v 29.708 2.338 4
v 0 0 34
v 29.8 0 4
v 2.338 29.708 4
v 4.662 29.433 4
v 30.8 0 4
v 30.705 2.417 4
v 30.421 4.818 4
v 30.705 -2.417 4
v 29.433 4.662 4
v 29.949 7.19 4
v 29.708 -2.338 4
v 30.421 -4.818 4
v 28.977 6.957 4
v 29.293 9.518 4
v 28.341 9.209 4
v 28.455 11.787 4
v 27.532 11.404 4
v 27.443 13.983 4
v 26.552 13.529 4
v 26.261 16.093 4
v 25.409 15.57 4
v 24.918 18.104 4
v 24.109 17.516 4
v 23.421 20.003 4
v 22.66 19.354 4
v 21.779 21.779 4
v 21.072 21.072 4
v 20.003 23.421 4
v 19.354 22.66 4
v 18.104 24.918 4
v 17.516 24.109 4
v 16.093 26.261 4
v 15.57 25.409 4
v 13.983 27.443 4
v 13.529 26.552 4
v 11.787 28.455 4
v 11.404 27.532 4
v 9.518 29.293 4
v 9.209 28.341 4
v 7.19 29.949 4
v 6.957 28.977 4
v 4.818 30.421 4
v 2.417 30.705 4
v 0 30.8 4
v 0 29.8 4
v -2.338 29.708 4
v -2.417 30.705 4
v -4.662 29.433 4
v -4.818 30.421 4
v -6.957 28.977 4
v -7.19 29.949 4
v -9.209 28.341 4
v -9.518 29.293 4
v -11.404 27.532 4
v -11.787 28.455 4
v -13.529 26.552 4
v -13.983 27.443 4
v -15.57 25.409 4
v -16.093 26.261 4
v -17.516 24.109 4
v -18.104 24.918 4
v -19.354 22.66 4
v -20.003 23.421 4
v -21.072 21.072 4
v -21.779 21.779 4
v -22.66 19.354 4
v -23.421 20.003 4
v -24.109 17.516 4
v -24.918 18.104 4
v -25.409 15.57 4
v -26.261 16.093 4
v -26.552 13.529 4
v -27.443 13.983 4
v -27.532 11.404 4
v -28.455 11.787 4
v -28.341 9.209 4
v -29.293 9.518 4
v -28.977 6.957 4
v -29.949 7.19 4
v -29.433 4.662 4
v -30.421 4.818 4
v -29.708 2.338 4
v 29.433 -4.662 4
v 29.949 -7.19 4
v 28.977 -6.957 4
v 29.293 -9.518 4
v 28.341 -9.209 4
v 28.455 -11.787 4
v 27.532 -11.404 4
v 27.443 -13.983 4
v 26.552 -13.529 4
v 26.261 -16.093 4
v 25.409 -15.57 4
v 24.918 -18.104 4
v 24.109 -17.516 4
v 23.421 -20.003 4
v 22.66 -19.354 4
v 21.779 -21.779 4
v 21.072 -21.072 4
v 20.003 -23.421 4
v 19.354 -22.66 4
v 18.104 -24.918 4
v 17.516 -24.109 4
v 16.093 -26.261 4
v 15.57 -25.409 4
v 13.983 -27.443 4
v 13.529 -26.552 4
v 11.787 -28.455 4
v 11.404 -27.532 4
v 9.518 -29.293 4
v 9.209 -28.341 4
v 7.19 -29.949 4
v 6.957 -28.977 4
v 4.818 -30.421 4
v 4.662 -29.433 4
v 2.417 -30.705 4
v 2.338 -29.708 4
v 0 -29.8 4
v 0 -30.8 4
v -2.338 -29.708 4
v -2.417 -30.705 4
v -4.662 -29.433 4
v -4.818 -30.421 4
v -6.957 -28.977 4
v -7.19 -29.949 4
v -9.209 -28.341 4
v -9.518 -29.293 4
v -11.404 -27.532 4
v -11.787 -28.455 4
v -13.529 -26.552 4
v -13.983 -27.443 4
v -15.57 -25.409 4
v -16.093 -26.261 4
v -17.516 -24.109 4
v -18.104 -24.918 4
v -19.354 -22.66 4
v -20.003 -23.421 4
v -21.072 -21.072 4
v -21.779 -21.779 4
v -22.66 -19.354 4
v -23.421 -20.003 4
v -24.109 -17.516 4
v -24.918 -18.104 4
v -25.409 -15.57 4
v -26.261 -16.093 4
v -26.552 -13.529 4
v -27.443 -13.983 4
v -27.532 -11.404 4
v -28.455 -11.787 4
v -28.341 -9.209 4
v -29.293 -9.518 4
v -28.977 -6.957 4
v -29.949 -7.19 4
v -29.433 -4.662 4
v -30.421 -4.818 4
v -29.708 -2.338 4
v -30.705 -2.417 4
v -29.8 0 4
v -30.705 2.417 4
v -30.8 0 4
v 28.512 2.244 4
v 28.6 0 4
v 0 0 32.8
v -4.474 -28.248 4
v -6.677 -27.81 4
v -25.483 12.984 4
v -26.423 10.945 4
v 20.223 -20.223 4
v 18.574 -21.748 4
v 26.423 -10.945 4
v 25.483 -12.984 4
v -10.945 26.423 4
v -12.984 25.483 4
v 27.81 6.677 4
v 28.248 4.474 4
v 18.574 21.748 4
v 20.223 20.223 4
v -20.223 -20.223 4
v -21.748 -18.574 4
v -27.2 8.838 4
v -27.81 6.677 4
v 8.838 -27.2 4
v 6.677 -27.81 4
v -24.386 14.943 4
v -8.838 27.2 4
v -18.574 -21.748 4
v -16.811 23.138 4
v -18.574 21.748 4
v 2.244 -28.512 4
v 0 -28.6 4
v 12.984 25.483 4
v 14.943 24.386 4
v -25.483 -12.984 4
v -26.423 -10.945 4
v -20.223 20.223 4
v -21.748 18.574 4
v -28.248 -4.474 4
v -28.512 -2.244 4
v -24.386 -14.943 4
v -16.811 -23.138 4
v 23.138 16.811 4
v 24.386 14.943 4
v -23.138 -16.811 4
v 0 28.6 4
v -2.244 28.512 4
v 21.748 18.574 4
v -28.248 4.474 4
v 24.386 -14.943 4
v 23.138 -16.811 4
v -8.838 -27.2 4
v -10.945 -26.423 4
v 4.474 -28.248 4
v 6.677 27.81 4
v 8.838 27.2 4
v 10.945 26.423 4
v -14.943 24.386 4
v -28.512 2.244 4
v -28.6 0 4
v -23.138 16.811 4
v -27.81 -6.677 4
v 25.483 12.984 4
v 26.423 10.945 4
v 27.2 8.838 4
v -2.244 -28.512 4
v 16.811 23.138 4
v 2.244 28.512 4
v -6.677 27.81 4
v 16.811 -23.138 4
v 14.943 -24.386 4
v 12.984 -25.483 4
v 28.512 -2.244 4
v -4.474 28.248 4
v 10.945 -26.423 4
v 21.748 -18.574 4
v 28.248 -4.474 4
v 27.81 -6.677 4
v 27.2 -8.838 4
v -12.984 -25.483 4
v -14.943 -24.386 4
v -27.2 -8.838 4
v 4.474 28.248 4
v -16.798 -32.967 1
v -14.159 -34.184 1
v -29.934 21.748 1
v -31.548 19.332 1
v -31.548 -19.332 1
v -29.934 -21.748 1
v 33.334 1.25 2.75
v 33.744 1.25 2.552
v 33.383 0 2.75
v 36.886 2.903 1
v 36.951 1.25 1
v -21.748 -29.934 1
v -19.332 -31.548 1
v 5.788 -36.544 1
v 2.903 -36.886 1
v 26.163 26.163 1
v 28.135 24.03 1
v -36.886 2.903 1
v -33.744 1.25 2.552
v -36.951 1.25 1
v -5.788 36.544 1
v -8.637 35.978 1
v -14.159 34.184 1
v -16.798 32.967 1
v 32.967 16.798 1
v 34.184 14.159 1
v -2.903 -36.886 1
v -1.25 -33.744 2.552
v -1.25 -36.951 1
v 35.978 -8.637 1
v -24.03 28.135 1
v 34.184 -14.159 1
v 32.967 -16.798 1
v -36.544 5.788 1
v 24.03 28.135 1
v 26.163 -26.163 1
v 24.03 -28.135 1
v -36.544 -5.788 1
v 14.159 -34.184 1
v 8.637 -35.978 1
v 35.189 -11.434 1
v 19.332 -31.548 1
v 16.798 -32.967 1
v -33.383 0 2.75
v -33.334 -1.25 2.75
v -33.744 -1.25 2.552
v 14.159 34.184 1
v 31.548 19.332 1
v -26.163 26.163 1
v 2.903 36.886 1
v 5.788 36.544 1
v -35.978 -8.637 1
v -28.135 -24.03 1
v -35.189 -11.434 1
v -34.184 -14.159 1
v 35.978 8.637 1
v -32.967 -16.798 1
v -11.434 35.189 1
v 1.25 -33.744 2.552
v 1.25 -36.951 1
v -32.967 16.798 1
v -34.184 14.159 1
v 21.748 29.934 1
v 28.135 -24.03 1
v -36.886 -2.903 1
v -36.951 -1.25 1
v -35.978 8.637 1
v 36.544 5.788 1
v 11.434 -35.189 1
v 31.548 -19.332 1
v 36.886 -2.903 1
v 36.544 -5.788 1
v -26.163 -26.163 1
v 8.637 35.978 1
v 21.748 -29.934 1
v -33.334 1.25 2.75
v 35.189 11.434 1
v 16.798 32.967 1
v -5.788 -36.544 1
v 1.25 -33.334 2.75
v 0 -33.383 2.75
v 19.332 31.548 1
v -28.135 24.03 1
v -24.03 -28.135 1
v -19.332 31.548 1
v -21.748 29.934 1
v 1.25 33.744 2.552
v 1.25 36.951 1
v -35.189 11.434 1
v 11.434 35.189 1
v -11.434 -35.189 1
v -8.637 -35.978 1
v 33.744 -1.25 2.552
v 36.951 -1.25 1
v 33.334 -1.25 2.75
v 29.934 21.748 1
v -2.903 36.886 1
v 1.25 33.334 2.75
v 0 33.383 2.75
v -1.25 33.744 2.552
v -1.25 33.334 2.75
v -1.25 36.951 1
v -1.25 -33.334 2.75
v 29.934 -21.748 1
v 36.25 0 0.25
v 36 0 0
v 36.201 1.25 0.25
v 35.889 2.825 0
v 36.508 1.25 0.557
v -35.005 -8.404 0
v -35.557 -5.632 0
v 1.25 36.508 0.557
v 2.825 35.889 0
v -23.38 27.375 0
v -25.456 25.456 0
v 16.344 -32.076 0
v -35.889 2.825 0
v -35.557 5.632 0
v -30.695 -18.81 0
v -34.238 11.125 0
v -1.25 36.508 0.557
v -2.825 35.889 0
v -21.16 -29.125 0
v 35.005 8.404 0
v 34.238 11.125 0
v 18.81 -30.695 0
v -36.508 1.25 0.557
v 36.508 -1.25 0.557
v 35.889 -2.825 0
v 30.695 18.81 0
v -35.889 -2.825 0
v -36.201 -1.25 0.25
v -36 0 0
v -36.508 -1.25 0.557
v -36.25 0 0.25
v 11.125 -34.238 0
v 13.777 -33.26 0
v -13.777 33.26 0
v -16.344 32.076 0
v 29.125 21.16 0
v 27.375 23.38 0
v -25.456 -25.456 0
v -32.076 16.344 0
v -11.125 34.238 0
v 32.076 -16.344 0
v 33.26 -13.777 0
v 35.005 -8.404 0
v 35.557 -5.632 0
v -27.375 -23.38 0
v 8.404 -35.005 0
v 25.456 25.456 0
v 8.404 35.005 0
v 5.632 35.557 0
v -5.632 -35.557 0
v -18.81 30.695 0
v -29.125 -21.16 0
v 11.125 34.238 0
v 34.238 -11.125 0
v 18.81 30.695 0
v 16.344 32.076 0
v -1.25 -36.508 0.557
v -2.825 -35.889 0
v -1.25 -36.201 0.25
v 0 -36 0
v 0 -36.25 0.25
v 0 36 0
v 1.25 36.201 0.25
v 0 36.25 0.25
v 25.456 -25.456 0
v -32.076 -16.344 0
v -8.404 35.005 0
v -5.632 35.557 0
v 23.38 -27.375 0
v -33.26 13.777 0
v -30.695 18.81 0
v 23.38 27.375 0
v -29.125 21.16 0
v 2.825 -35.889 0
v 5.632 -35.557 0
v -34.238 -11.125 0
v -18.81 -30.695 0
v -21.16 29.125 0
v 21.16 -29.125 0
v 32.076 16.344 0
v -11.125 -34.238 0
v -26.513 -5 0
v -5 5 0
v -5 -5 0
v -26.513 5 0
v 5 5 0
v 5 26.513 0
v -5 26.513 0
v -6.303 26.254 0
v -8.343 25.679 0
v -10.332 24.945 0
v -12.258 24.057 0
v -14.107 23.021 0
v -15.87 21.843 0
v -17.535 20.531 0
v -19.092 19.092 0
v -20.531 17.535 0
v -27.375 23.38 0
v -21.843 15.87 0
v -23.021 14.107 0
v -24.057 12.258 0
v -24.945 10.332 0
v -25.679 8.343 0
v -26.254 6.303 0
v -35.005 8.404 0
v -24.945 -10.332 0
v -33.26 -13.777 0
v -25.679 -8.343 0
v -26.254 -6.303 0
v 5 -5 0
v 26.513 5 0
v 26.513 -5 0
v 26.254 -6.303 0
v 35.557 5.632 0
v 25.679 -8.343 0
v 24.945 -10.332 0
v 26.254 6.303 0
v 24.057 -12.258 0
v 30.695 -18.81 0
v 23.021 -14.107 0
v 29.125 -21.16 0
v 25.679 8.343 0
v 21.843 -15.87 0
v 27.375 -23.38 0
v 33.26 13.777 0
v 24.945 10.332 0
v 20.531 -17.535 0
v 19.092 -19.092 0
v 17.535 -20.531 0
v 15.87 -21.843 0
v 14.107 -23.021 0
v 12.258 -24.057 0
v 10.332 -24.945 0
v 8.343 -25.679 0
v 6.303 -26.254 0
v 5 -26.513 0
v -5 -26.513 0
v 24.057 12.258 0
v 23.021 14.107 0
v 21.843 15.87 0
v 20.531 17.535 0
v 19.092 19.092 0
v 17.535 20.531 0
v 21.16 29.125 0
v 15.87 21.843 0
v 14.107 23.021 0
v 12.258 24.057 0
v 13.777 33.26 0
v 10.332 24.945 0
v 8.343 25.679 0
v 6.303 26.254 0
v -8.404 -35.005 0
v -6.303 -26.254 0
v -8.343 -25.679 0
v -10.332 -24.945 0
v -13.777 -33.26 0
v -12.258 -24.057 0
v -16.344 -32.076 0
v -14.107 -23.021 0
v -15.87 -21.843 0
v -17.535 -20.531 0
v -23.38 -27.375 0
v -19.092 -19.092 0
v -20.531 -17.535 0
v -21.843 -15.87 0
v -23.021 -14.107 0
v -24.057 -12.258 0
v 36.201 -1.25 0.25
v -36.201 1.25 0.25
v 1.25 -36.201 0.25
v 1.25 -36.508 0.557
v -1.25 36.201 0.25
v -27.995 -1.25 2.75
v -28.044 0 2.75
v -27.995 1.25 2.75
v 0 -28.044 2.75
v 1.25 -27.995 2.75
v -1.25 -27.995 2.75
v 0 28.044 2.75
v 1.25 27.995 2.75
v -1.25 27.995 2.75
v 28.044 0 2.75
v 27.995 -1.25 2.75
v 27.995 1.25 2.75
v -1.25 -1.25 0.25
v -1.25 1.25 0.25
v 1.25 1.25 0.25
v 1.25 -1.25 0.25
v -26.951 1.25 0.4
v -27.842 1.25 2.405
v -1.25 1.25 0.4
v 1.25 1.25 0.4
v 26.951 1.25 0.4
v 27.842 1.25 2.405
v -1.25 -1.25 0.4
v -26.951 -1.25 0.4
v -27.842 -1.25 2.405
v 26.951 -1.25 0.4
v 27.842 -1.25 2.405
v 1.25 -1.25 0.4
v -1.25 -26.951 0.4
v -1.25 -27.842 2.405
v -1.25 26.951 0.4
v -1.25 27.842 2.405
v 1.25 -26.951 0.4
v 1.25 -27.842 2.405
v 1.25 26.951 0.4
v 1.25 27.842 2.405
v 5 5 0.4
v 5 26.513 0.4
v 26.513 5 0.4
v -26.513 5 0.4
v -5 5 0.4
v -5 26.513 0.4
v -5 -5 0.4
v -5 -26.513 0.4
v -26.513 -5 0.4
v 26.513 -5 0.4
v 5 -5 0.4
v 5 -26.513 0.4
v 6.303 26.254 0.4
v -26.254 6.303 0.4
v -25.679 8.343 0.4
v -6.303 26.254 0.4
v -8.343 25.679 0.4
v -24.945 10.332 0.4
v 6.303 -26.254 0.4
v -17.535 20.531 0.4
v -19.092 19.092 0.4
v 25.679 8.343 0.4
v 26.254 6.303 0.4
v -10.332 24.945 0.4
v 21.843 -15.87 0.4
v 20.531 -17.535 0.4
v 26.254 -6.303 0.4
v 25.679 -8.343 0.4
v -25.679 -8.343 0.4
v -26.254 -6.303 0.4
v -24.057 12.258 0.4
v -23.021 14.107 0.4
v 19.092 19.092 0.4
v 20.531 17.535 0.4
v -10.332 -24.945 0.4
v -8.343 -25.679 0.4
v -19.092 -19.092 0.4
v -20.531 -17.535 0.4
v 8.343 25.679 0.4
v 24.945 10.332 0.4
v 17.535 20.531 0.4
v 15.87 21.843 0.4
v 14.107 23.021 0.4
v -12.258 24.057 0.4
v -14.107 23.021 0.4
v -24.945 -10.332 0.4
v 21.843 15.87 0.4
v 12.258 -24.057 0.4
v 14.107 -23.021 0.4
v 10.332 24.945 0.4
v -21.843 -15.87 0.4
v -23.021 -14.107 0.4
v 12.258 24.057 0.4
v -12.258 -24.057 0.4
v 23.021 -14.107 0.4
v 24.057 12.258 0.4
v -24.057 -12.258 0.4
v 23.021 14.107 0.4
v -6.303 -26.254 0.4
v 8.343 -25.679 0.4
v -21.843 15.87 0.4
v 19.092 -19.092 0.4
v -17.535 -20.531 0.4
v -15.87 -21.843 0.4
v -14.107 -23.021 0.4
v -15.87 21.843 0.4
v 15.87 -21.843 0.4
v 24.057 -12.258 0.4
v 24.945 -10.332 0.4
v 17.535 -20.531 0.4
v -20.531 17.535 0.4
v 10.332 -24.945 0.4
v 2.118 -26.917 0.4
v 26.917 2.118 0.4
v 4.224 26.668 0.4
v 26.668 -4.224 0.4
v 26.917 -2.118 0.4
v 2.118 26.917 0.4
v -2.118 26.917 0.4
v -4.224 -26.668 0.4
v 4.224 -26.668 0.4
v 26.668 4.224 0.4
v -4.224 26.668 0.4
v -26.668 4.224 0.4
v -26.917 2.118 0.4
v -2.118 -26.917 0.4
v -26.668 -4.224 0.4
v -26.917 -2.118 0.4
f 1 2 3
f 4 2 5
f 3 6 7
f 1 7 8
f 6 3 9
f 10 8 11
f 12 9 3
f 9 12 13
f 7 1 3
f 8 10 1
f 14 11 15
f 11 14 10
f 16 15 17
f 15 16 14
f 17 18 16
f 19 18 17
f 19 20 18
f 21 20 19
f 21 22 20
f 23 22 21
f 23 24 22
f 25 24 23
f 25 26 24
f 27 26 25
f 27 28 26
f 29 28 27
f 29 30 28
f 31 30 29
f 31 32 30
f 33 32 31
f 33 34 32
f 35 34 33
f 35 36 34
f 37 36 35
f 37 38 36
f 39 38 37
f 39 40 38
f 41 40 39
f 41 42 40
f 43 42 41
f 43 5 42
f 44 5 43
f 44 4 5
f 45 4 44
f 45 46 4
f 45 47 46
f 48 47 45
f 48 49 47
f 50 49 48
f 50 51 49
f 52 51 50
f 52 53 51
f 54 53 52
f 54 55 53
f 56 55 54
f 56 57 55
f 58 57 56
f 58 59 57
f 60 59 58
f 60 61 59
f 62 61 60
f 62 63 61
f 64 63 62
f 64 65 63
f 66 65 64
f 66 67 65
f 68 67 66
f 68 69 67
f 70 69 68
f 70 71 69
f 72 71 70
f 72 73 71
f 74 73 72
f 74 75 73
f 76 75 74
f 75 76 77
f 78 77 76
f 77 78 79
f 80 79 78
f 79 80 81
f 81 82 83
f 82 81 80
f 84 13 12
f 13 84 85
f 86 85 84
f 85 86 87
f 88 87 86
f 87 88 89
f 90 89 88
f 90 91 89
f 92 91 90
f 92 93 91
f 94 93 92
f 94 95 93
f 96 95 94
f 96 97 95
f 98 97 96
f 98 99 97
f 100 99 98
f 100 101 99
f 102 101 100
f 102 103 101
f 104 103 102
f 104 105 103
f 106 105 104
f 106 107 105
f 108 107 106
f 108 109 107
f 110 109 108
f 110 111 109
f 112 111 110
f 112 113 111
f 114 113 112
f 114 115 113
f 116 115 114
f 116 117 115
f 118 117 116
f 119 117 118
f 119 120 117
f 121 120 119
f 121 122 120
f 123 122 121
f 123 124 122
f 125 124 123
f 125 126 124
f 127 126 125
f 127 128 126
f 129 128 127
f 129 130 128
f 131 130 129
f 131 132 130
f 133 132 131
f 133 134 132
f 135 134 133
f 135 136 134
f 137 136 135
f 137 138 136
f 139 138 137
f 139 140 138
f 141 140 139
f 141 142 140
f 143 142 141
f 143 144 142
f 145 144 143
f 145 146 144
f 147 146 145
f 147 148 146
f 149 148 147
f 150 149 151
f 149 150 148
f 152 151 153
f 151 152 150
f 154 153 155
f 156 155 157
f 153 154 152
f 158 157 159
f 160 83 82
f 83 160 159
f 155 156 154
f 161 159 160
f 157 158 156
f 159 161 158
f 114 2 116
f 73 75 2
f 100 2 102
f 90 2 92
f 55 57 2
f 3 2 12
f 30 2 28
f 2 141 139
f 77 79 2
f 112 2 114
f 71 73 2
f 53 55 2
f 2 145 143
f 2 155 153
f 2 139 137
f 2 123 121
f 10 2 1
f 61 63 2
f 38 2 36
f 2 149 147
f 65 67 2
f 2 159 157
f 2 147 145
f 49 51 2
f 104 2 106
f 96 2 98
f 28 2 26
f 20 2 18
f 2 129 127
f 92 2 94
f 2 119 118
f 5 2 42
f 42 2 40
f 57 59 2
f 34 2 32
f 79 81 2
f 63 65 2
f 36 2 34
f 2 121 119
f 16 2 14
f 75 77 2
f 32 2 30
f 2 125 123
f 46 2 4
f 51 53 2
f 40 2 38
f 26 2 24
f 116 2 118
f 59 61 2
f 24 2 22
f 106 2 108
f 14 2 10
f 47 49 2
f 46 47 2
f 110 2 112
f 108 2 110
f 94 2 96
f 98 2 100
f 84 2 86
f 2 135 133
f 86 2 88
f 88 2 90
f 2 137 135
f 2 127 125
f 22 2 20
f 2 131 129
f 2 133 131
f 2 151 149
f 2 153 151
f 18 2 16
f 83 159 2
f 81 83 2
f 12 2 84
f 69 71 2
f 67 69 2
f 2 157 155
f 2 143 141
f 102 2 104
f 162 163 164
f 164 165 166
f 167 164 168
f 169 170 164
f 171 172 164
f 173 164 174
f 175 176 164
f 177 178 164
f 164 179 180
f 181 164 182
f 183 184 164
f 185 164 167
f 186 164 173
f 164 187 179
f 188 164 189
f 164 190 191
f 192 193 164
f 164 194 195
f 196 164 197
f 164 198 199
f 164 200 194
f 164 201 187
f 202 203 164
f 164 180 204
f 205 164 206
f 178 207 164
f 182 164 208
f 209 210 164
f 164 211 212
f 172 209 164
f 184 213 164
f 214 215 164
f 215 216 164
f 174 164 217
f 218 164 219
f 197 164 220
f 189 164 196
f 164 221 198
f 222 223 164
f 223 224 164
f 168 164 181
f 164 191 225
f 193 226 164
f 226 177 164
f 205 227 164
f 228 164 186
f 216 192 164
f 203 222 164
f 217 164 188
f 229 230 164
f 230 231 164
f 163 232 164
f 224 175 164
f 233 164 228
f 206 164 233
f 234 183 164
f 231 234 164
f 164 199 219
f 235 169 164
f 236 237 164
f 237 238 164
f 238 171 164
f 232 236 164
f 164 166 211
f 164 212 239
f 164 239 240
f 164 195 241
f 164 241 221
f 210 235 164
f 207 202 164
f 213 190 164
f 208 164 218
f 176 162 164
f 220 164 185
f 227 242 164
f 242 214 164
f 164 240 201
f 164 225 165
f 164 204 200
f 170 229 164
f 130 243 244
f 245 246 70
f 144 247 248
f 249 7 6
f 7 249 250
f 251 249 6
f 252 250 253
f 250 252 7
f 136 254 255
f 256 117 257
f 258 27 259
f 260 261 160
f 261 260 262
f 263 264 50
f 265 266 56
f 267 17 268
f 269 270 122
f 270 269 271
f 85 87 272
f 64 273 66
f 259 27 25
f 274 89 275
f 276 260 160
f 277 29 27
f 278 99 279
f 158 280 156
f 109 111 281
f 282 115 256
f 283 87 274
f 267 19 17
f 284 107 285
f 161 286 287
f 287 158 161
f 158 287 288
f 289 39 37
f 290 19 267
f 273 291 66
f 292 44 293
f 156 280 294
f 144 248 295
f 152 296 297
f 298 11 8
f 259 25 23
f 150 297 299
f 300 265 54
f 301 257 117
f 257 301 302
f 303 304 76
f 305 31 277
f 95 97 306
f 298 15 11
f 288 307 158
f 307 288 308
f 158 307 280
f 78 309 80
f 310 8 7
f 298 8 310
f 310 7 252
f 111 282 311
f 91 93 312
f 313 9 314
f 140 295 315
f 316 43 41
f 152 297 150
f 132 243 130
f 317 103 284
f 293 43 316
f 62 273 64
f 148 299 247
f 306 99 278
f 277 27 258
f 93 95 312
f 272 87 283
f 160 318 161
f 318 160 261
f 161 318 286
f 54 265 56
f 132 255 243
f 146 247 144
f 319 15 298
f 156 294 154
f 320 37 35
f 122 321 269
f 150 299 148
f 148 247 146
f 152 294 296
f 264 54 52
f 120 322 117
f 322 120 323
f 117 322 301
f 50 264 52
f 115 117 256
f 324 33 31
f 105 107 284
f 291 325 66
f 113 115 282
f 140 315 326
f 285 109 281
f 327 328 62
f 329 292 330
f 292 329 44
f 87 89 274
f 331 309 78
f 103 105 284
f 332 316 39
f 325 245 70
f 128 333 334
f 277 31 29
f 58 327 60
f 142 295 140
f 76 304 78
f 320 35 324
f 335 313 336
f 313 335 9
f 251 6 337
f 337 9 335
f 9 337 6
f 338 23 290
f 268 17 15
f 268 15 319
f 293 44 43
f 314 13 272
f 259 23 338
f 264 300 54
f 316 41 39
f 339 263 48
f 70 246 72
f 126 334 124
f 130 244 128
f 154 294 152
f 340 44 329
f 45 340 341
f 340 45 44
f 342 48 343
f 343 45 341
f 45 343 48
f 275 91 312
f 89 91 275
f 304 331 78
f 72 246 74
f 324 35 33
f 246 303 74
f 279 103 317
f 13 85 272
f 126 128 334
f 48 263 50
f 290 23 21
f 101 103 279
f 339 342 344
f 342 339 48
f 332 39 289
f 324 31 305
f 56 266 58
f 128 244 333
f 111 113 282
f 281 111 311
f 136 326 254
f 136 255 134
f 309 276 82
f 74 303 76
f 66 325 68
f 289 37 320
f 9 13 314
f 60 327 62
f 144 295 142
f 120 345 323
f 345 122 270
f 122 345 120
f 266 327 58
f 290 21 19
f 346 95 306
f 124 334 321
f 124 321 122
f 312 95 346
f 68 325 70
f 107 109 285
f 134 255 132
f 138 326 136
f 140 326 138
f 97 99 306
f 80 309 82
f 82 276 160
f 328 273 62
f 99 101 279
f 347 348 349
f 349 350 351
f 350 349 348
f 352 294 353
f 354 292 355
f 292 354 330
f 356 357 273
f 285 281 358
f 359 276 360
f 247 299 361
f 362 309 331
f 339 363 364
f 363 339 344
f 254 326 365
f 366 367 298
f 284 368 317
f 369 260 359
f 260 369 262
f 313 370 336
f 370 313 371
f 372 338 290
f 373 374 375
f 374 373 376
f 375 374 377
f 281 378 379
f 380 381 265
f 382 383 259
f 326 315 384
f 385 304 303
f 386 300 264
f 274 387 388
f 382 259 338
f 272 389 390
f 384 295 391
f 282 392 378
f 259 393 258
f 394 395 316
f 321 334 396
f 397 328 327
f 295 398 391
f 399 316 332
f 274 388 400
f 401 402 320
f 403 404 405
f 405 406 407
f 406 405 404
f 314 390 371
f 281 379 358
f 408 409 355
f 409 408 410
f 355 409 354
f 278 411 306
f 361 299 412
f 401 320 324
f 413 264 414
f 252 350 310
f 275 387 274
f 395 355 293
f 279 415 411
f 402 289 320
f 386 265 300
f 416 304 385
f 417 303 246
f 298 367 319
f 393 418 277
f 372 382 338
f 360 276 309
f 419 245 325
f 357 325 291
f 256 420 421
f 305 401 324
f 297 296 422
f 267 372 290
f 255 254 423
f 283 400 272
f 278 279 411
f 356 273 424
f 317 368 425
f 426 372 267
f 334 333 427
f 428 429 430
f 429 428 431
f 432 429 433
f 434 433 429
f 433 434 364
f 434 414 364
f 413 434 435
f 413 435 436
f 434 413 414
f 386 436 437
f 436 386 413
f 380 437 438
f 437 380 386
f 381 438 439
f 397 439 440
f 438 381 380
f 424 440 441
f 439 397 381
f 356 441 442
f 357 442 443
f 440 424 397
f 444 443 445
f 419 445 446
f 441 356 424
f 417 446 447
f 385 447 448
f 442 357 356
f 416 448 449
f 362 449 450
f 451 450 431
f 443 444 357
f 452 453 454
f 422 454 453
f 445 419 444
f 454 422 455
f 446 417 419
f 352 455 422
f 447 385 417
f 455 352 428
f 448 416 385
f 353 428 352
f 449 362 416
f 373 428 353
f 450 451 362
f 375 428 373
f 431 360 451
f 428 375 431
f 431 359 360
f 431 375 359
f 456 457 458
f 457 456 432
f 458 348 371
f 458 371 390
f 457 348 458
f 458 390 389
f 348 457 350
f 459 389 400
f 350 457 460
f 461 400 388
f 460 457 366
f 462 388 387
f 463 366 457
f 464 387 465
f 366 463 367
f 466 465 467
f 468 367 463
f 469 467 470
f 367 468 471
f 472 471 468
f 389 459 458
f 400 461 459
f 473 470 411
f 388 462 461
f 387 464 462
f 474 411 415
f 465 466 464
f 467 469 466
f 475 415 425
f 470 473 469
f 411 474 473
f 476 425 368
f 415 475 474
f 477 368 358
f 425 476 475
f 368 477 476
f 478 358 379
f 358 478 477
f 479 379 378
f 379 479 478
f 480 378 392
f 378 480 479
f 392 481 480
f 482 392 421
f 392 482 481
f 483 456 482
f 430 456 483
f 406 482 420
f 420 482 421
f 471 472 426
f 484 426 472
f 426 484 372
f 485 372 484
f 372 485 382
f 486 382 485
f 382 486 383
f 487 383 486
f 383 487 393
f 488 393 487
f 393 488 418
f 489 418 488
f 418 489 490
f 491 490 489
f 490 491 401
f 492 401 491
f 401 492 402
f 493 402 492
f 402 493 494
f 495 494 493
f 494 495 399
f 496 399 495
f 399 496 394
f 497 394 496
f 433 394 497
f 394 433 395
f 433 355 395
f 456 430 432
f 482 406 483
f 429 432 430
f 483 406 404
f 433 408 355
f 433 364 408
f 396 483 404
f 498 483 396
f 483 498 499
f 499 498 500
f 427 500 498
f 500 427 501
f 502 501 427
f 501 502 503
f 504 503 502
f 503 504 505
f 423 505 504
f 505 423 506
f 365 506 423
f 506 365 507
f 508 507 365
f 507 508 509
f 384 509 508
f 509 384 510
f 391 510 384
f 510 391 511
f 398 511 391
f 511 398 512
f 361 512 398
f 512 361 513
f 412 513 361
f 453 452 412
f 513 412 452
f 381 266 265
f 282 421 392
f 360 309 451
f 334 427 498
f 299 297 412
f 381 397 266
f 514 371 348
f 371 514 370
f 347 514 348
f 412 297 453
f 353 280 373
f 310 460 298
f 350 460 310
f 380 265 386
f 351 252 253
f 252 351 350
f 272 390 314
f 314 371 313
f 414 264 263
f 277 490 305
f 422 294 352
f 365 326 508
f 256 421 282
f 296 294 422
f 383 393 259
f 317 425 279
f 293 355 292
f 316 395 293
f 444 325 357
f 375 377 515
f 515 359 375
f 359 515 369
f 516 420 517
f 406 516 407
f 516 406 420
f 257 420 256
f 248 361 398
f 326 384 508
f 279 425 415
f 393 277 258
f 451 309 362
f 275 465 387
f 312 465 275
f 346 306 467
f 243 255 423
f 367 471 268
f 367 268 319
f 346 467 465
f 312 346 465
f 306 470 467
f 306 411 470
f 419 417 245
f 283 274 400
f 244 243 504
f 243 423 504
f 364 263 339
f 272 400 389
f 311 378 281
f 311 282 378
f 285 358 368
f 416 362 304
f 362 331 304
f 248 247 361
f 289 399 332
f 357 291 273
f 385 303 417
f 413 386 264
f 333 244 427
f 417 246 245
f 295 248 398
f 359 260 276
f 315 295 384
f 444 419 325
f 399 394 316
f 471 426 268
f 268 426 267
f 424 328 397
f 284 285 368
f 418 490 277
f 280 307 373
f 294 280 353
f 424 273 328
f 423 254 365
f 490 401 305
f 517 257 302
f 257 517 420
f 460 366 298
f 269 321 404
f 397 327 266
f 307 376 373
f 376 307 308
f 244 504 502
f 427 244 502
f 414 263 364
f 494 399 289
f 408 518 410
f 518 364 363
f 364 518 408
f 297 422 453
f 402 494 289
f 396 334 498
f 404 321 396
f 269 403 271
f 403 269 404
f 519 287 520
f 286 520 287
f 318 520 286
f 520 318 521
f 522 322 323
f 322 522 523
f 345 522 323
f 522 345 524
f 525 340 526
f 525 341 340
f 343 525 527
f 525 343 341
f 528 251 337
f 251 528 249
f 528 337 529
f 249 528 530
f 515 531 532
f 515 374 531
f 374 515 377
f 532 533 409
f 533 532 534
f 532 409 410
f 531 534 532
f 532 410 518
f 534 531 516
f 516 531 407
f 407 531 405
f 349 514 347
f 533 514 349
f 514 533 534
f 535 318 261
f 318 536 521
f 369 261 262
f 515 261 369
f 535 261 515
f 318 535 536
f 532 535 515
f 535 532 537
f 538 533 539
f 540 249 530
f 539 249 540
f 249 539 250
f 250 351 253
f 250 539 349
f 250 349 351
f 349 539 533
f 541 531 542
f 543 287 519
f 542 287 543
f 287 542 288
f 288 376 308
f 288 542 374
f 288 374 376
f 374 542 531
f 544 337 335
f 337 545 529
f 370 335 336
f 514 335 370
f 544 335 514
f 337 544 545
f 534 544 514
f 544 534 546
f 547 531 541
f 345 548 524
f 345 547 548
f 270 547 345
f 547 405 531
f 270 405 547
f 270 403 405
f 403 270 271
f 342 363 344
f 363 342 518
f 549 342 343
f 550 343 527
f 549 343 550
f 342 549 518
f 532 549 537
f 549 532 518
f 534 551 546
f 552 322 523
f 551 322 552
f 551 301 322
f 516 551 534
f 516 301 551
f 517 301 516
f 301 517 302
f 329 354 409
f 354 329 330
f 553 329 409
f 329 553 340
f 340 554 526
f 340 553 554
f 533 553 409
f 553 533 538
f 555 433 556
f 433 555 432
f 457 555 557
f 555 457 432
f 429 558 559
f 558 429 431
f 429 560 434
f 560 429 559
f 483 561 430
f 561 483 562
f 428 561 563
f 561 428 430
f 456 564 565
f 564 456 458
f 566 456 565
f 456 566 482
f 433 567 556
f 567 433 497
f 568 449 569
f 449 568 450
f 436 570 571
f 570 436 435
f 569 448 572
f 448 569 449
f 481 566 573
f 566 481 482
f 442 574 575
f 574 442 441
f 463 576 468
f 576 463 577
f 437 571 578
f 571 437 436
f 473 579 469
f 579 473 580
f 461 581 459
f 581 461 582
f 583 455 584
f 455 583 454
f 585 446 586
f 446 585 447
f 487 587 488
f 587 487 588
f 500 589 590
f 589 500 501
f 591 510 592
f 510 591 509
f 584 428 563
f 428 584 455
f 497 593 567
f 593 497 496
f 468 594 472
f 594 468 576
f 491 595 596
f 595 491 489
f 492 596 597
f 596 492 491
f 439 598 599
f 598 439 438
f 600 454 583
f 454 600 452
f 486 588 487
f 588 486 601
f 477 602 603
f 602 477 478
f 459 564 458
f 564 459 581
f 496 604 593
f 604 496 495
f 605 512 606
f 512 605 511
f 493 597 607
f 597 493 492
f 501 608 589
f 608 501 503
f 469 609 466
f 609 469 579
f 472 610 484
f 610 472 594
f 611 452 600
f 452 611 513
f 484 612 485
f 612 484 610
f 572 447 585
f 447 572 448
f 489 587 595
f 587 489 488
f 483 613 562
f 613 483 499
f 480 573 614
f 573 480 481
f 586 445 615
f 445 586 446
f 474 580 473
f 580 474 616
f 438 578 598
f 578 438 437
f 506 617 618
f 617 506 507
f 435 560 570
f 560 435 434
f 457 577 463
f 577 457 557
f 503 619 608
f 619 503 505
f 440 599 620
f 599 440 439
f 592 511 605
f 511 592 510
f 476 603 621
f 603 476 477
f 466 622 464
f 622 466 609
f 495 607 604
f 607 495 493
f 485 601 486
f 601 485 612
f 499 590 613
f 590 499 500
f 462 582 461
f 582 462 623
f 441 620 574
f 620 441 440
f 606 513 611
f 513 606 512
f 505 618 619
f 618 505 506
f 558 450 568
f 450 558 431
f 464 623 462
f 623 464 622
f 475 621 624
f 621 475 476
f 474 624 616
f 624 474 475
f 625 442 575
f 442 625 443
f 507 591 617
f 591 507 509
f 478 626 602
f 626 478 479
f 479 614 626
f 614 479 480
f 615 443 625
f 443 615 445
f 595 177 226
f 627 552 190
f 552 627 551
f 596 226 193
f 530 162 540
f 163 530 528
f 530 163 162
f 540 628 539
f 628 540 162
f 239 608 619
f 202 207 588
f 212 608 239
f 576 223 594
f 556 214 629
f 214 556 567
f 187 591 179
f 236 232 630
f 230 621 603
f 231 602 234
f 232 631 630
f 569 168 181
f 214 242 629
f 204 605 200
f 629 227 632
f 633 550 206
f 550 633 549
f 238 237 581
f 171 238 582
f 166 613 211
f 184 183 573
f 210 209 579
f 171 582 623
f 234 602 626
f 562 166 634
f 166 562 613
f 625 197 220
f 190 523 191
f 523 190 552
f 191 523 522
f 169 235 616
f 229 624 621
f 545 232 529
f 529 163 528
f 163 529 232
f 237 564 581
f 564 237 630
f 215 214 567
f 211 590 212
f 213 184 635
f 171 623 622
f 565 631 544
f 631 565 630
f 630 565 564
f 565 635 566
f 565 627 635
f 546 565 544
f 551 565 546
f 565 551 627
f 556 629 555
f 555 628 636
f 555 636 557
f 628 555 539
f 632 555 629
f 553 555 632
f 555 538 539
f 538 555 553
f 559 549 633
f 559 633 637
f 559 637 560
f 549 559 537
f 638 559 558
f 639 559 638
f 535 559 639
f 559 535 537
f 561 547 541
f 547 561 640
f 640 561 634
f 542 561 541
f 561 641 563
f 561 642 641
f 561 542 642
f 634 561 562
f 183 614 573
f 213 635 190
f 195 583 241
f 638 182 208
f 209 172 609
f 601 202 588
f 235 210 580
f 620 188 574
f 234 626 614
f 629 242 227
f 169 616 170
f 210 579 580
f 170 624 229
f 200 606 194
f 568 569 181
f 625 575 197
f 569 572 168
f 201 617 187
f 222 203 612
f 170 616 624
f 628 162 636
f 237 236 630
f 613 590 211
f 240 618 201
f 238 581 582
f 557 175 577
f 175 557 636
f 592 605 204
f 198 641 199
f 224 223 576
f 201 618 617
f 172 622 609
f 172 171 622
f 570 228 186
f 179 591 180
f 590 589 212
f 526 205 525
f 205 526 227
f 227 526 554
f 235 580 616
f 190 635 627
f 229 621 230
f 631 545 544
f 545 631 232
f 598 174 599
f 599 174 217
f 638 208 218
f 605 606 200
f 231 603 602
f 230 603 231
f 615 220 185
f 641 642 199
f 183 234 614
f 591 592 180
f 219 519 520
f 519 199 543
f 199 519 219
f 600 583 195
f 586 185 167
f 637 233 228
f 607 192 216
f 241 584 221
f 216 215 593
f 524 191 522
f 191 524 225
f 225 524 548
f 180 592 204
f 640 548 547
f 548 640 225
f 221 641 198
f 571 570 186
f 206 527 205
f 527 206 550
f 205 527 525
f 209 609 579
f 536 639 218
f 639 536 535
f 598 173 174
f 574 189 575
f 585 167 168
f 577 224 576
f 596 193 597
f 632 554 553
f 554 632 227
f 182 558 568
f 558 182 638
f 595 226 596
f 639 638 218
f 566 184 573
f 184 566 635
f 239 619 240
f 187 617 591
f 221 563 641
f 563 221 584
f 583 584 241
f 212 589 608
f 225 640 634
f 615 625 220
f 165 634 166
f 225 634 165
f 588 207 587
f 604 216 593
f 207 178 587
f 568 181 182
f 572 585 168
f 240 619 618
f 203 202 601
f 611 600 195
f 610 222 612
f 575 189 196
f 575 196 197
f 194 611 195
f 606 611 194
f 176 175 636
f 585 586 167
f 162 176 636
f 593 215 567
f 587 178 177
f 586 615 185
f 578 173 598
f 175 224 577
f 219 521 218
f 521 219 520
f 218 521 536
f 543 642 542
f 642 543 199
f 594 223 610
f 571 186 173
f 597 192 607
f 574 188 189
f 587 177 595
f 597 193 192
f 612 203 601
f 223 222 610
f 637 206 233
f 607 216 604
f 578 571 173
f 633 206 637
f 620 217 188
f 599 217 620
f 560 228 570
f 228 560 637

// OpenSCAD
$fn=80;
size1 = 30;
size2 = 37;
base_height = 4;
pointy = true;

if(!pointy){
 color("black")
translate([0,0,base_height+30-9.2])
difference(){
    sphere(6.5);
    translate([0,0,-3])cube([20,20,10], true);
}
}

 translate([0,0,base_height])
 color("black")
 difference(){
     if(pointy)
        cylinder(  30,    size1-0.2,    0);
     else
        cylinder(  30-5,    size1-0.2,    5);
     cylinder(  30-1.2,    size1-0.2-1.2,    0);
  }
 //color("gray")
 //cylinder(  5,    12,    0);
 

 difference(){
  color("black")
     union(){
        translate([0,0,1])
         cylinder(  base_height-1,    size2,    size1+1-0.2);
         cylinder(  1,    size2-1,    size2);
     }
 translate([0,0,0.4])
 cylinder(  base_height-0.4,    size2-10,    size1-0.2-1.2);
     
     for(i=[0:1])
     rotate([0,0,90*i])
     translate([0,0,1.5])
     cube([100,2.5,2.5], true);
     
     intersection(){
      cylinder(  0.8,    size2-10,    size2-10);
    
     for(i=[0:3])
     rotate([0,0,90*i])
     translate([5,5,0])
     cube([100,100,0.8]);
     
 }
 }
 
 
 /*
  
 translate([0,0,base_height])
 color("gold")
intersection(){
difference(){
 cylinder(  size1+1,    size1+1,    0);
 cylinder(  size1,    size1,    0);
}
 sphere_ring();
 }
 module sphere_ring() {
     for(i=[0:12])
         rotate([0,0,360/12*i])
         translate([size1+1,0,-2])
         sphere(9);
     
}
*/
